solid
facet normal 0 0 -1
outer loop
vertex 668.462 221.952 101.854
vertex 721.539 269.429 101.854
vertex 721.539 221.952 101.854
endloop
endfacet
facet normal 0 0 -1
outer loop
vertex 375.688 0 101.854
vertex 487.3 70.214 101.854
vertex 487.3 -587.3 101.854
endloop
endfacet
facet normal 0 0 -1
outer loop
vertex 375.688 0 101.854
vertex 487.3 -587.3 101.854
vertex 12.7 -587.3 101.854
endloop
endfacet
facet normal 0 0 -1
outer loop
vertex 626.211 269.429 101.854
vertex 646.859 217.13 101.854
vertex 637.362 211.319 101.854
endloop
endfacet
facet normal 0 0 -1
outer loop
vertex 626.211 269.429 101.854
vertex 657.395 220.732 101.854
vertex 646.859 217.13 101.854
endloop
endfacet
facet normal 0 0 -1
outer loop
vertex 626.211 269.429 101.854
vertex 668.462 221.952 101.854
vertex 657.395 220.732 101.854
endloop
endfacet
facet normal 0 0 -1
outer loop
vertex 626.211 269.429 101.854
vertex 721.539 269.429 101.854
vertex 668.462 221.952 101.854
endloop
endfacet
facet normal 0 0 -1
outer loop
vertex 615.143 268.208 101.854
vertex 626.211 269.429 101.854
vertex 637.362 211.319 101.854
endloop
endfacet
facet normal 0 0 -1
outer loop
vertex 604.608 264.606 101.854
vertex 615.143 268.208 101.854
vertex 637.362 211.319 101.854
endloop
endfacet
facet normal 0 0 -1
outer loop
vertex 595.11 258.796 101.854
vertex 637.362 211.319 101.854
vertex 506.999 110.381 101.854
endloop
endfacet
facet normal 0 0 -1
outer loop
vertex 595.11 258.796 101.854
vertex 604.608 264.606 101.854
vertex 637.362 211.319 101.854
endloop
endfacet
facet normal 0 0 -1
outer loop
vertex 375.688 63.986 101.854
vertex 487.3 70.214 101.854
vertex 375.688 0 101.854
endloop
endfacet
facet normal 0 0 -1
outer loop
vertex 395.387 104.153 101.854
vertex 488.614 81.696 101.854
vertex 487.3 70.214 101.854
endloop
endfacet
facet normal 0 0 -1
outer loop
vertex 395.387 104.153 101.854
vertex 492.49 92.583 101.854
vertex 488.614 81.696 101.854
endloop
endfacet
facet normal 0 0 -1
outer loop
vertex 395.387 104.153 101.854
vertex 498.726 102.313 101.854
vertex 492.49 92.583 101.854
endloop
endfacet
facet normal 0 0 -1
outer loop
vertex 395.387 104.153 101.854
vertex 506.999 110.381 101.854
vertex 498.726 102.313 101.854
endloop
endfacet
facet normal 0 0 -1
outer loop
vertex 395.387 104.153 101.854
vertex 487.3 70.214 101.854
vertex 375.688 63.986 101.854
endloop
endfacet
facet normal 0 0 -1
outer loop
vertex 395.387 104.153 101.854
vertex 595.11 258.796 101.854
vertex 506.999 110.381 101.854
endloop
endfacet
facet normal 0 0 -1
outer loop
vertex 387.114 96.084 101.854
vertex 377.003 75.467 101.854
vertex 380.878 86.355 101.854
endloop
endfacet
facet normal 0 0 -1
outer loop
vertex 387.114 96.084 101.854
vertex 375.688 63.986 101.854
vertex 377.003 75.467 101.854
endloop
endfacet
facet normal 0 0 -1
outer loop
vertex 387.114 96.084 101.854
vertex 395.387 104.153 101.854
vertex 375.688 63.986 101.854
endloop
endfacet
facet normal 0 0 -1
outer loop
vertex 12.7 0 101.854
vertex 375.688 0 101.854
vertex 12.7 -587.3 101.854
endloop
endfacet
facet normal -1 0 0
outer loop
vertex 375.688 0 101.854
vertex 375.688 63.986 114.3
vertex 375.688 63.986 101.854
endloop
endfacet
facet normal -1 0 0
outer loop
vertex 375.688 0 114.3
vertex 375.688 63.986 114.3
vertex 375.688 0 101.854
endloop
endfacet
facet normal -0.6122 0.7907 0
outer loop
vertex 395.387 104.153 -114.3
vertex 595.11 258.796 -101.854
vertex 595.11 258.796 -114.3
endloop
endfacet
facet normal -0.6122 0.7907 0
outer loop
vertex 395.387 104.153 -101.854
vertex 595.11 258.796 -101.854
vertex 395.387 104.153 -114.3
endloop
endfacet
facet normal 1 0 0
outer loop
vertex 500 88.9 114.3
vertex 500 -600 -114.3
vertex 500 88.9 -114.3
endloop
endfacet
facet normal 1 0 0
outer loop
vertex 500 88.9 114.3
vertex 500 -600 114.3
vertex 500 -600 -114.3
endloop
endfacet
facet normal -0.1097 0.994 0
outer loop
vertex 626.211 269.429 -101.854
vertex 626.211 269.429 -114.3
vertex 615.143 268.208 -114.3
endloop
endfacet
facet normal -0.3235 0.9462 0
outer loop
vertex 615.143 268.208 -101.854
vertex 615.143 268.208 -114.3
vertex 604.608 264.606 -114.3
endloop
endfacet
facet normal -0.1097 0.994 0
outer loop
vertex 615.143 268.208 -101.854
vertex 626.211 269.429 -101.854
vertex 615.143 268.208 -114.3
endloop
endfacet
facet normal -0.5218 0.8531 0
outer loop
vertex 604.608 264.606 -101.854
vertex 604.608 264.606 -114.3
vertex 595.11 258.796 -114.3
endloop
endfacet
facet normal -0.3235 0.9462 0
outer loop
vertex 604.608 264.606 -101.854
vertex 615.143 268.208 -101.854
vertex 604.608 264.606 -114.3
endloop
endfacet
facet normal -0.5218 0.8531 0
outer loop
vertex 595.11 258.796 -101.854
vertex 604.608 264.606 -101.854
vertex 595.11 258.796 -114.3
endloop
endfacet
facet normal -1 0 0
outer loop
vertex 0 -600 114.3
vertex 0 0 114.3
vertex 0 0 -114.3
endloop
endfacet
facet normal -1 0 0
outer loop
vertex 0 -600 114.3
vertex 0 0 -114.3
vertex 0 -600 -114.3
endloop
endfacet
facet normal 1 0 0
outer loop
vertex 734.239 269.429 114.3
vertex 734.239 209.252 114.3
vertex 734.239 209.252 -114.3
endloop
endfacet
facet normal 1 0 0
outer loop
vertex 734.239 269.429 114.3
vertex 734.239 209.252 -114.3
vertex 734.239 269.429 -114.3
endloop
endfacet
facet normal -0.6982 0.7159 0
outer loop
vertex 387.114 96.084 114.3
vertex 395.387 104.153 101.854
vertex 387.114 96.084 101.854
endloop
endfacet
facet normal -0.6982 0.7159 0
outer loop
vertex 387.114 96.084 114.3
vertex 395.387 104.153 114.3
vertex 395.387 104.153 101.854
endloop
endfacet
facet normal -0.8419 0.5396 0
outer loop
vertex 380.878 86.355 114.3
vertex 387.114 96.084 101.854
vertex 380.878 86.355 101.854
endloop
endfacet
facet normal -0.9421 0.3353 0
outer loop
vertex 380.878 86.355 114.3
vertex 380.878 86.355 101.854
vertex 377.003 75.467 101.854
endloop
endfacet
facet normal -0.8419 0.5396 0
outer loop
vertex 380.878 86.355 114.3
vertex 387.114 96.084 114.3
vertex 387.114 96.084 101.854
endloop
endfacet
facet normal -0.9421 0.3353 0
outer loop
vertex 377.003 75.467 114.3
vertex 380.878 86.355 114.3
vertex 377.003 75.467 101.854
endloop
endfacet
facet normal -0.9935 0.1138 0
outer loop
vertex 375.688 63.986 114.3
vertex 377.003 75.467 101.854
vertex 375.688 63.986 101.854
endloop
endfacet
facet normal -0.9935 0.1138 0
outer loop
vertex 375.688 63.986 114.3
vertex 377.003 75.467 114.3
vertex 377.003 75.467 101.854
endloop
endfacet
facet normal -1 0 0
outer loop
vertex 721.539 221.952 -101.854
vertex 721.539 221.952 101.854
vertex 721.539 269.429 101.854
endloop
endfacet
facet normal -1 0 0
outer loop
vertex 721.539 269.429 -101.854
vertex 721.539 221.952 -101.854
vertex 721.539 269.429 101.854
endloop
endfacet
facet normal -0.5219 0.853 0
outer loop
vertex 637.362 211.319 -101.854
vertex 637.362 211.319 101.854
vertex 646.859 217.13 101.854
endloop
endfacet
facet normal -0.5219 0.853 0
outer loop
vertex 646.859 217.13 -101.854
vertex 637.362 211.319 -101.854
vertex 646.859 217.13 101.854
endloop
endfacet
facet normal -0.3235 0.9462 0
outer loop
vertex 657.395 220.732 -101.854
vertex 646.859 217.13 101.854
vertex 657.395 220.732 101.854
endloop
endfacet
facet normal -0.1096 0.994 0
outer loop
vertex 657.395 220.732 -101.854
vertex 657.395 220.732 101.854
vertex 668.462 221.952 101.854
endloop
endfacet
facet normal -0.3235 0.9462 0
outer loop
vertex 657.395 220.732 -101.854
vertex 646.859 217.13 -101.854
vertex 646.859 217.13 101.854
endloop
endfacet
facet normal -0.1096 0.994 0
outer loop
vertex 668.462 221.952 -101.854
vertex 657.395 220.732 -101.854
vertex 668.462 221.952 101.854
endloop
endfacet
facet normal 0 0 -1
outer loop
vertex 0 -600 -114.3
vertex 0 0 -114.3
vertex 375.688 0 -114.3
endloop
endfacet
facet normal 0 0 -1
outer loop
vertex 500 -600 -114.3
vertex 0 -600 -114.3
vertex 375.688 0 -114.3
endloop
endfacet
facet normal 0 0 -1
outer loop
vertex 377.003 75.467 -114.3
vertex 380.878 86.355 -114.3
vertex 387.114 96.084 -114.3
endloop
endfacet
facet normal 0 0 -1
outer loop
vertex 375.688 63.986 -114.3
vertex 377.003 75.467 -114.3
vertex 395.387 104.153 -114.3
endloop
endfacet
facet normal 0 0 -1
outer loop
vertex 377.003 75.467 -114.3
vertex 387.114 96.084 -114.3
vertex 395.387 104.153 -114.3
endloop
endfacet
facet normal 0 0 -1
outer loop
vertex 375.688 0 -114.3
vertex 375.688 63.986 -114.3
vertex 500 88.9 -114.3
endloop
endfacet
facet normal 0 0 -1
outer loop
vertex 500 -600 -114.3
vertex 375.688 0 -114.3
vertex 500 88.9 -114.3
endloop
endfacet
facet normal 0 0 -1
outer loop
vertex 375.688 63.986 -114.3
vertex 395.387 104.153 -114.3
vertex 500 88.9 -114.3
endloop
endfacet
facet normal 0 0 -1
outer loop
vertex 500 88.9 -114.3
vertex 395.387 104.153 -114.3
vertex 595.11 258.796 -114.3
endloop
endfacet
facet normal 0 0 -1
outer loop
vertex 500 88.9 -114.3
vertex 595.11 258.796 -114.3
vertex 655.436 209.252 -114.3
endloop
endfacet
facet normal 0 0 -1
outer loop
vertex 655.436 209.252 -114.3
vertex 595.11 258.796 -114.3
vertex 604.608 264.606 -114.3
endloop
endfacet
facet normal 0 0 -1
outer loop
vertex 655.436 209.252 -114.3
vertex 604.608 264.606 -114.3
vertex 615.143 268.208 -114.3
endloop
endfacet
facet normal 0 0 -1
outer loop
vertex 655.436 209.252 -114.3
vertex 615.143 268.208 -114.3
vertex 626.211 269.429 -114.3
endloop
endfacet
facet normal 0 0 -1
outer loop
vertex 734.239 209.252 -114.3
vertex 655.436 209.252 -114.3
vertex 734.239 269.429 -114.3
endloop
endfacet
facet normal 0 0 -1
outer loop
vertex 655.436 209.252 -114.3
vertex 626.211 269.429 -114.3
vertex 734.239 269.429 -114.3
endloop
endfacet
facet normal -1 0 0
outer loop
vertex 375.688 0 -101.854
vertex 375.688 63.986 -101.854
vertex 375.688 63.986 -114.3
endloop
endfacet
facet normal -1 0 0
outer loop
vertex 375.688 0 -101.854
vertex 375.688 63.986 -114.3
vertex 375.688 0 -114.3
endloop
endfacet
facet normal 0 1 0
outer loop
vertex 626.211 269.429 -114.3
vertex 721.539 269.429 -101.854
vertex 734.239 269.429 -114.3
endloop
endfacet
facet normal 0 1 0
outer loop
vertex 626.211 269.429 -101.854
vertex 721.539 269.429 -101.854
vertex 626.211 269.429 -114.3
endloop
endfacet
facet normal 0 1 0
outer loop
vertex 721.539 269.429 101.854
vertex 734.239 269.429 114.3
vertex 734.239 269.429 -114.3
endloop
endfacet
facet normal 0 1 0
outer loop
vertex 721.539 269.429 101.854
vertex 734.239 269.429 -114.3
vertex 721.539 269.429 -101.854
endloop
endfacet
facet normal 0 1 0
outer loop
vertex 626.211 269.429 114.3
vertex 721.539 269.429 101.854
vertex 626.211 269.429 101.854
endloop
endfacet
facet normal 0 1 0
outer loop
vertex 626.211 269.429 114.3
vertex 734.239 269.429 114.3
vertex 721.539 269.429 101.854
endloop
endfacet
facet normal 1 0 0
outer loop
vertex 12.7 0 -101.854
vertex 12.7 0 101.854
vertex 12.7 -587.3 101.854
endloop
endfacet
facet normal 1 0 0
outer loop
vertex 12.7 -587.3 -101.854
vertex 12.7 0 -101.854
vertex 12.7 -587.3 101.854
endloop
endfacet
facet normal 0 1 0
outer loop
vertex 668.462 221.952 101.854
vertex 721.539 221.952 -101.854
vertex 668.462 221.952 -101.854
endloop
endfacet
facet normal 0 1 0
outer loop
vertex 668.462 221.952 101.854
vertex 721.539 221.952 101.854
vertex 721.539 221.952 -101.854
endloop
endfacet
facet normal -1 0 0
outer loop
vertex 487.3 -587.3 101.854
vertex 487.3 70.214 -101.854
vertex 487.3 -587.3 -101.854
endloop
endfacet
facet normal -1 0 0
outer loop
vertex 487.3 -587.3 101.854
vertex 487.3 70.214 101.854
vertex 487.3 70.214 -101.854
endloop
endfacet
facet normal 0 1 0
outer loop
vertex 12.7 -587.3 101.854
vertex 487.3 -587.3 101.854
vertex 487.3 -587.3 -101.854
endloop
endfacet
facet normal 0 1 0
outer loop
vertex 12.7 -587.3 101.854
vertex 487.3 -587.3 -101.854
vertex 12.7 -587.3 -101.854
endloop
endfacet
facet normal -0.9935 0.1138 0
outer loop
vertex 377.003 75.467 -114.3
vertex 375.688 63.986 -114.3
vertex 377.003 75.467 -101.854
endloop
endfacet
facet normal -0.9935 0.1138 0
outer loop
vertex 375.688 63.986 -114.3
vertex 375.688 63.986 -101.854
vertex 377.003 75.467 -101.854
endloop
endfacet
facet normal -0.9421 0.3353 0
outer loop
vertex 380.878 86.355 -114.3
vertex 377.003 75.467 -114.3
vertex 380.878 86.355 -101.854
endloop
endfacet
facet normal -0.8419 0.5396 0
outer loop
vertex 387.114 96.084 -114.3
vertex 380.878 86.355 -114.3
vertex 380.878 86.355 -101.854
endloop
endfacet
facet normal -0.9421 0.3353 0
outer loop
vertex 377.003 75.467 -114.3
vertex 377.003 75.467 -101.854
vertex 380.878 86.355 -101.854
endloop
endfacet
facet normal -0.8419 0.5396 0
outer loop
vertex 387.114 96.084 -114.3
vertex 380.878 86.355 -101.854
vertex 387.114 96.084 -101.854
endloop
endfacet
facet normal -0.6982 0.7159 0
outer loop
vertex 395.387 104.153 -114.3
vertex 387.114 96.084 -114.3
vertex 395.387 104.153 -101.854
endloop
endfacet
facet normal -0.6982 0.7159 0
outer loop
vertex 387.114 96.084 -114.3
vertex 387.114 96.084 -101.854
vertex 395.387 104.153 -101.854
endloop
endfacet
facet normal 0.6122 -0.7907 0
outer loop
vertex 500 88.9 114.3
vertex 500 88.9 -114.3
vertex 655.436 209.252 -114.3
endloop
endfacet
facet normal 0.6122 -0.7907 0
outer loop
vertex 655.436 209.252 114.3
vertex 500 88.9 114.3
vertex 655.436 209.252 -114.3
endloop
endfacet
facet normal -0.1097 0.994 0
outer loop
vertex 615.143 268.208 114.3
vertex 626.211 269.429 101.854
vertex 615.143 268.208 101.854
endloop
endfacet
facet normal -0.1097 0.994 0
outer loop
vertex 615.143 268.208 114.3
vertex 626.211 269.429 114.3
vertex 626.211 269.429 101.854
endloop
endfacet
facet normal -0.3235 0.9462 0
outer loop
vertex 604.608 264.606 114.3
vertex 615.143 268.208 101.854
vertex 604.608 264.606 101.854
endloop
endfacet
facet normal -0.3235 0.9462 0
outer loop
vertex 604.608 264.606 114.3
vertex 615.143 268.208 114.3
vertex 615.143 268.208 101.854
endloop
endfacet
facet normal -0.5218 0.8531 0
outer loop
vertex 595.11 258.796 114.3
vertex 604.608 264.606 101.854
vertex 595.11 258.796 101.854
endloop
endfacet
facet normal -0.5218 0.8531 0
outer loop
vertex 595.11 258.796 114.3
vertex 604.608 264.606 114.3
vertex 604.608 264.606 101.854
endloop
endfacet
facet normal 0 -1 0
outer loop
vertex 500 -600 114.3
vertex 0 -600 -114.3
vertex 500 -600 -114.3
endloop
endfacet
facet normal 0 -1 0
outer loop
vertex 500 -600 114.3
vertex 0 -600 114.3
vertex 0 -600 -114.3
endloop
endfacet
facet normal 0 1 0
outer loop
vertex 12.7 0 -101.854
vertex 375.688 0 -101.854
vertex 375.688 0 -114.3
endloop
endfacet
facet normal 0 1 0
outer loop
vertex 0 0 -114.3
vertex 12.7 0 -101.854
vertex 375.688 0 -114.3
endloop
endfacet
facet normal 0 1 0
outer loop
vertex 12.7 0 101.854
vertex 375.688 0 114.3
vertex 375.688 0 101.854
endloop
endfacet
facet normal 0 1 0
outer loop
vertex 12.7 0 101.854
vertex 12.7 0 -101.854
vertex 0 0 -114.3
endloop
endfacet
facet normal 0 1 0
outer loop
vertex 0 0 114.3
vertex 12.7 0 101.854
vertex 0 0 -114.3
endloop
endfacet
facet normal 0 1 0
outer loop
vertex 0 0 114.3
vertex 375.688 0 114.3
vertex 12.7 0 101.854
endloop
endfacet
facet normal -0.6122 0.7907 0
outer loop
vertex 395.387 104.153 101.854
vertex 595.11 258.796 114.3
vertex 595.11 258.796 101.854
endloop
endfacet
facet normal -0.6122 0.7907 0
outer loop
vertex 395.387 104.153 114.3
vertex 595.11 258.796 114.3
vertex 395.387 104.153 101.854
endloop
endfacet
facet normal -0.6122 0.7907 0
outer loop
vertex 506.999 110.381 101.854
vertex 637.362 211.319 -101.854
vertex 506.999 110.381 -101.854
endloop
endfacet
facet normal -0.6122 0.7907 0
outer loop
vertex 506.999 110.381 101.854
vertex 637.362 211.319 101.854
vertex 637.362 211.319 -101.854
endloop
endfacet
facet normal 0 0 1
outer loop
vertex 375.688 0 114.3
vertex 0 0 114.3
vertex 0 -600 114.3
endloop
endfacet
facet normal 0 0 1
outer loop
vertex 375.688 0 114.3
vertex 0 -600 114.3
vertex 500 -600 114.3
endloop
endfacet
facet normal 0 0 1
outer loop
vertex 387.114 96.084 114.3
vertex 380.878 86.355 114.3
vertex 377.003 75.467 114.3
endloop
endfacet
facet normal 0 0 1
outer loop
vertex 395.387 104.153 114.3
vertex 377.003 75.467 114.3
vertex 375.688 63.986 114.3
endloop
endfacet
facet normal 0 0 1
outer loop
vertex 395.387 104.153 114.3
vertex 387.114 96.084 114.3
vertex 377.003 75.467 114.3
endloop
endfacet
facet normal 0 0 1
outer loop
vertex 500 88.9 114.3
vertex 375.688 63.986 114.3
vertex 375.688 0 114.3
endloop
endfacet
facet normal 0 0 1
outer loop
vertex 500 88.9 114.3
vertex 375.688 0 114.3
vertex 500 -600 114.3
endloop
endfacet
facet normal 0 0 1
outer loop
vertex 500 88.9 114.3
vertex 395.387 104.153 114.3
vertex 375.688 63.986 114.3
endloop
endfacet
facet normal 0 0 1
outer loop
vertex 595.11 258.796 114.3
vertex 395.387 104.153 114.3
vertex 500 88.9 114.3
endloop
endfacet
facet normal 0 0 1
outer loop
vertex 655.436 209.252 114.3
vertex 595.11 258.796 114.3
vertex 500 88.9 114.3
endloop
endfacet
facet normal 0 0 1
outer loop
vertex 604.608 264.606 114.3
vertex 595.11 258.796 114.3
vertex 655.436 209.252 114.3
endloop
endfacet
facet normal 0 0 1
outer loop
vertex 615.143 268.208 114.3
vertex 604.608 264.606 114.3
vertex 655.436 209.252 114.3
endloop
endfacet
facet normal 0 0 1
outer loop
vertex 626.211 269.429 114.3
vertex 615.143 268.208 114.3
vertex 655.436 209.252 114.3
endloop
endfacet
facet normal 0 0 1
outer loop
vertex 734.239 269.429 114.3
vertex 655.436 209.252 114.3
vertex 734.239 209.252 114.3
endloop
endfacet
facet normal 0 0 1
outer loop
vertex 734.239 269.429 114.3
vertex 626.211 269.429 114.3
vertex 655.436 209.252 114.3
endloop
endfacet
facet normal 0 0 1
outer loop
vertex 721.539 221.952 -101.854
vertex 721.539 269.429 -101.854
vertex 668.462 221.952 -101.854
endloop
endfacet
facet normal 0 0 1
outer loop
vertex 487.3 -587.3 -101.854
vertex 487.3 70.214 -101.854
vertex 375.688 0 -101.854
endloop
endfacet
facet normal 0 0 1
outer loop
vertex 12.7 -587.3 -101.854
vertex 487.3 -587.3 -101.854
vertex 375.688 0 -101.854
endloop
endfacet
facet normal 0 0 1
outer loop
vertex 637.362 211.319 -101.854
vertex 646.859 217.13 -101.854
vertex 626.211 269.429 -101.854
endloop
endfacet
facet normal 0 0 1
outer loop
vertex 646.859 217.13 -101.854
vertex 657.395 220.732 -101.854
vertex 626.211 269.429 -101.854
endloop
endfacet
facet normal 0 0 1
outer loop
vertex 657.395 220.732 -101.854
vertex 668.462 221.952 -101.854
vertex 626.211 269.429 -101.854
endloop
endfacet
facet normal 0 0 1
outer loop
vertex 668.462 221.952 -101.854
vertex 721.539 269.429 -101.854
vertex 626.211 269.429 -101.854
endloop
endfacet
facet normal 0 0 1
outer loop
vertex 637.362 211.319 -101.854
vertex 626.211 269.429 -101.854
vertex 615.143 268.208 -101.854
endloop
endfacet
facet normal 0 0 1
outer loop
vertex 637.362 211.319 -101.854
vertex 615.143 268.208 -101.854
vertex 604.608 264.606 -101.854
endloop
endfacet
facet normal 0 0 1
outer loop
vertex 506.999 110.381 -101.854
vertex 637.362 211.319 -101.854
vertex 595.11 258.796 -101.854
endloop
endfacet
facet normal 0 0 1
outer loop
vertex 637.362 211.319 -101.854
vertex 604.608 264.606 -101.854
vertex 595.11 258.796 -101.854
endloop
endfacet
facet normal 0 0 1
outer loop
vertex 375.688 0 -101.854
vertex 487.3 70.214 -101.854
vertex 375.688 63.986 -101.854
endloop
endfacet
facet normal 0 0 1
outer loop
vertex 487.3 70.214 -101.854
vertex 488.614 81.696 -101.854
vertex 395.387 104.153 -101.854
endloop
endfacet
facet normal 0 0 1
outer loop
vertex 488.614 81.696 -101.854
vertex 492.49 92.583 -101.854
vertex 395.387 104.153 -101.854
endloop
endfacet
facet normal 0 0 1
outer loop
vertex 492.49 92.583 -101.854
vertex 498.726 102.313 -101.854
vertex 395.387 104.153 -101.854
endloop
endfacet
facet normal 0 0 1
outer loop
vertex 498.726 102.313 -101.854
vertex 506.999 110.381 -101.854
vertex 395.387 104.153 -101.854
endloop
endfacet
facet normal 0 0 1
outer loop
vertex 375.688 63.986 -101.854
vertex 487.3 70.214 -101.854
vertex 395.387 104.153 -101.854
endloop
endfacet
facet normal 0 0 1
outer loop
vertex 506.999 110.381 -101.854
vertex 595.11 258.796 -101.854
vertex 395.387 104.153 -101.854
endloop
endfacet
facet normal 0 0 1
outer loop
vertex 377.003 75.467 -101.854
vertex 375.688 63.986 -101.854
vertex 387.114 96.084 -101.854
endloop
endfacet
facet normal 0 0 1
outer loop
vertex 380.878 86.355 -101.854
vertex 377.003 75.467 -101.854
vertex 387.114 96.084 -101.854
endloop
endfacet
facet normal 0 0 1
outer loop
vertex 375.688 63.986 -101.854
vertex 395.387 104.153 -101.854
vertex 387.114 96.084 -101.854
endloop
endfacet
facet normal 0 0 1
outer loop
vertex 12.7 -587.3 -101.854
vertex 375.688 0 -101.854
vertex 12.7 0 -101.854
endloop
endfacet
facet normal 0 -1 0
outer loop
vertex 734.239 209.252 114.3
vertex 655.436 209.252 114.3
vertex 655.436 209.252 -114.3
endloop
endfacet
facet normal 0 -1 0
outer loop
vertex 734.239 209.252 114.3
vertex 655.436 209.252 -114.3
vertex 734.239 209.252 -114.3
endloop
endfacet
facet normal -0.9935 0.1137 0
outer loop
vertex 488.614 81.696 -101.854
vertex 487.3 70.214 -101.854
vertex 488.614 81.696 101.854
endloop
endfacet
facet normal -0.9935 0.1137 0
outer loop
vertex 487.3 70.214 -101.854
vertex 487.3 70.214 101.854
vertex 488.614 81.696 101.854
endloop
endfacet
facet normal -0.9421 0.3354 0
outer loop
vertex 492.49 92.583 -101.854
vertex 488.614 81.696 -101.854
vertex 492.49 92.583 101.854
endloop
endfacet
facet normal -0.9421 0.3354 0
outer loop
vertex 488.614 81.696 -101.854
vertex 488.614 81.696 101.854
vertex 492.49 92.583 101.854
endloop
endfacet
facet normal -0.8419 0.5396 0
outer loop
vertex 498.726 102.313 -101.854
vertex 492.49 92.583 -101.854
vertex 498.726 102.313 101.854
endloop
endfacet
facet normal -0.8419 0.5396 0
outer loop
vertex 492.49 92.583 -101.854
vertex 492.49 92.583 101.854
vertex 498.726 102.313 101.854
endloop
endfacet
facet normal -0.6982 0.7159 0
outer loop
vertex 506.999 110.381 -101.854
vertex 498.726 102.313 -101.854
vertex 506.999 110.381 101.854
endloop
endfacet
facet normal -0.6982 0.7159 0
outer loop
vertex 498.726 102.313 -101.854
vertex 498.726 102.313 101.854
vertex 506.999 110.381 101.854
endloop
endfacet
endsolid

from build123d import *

# Parameters (mm, degrees)
EXTRUDE_1_DEPTH     = 114.3
CUT_EXTRUDE_1_DEPTH = 101.854
FILLET_2_R          = 50.8
FILLET_3_R          = 50.8
FILLET_4_R          = 50.8
FILLET_5_R          = 50.8


with BuildPart() as part:
    # 草图1 → 凸台-拉伸1 (new, symmetric)
    with BuildSketch(Plane.XY):
        Polygon((500, 0), (500, 88.9), (655.436388473, 209.252423204), (734.238570332, 209.252423204), (734.238570332, 269.428634805), (608.842711428, 269.428634805), (375.688128719, 88.9), (375.688128719, 0), (0, 0), (0, -600), (500, -600), align=None)
    extrude(amount=EXTRUDE_1_DEPTH, both=True)

    # 草图2 → 切除-拉伸1 (cut, symmetric)
    with BuildSketch(Plane.XY):
        Polygon((12.7, -12.7), (12.7, 37.178760919), (353.872470169, 37.178760919), (353.872470169, 355.973839439), (721.538570332, 346.822359749), (721.538570332, 256.728634805), (721.538570332, 221.952423204), (651.094376347, 221.952423204), (487.3, 95.128516047), (487.3, -587.3), (12.7, -587.3), align=None)
    extrude(amount=CUT_EXTRUDE_1_DEPTH, both=True, mode=Mode.SUBTRACT)

    # 圆角2
    fillet_2_edges = [part.edges().sort_by_distance(p)[0] for p in [
        (487.3, 95.128516047, 0),
    ]]
    fillet(fillet_2_edges, radius=FILLET_2_R)

    # 圆角3
    fillet_3_edges = [part.edges().sort_by_distance(p)[0] for p in [
        (651.094376347, 221.952423204, 0),
    ]]
    fillet(fillet_3_edges, radius=FILLET_3_R)

    # 圆角4
    fillet_4_edges = [part.edges().sort_by_distance(p)[0] for p in [
        (608.842711428, 269.428634805, 108.077),
        (608.842711428, 269.428634805, -108.077),
    ]]
    fillet(fillet_4_edges, radius=FILLET_4_R)

    # 圆角5
    fillet_5_edges = [part.edges().sort_by_distance(p)[0] for p in [
        (375.688128719, 88.9, 108.077),
        (375.688128719, 88.9, -108.077),
    ]]
    fillet(fillet_5_edges, radius=FILLET_5_R)


solid = part.part
